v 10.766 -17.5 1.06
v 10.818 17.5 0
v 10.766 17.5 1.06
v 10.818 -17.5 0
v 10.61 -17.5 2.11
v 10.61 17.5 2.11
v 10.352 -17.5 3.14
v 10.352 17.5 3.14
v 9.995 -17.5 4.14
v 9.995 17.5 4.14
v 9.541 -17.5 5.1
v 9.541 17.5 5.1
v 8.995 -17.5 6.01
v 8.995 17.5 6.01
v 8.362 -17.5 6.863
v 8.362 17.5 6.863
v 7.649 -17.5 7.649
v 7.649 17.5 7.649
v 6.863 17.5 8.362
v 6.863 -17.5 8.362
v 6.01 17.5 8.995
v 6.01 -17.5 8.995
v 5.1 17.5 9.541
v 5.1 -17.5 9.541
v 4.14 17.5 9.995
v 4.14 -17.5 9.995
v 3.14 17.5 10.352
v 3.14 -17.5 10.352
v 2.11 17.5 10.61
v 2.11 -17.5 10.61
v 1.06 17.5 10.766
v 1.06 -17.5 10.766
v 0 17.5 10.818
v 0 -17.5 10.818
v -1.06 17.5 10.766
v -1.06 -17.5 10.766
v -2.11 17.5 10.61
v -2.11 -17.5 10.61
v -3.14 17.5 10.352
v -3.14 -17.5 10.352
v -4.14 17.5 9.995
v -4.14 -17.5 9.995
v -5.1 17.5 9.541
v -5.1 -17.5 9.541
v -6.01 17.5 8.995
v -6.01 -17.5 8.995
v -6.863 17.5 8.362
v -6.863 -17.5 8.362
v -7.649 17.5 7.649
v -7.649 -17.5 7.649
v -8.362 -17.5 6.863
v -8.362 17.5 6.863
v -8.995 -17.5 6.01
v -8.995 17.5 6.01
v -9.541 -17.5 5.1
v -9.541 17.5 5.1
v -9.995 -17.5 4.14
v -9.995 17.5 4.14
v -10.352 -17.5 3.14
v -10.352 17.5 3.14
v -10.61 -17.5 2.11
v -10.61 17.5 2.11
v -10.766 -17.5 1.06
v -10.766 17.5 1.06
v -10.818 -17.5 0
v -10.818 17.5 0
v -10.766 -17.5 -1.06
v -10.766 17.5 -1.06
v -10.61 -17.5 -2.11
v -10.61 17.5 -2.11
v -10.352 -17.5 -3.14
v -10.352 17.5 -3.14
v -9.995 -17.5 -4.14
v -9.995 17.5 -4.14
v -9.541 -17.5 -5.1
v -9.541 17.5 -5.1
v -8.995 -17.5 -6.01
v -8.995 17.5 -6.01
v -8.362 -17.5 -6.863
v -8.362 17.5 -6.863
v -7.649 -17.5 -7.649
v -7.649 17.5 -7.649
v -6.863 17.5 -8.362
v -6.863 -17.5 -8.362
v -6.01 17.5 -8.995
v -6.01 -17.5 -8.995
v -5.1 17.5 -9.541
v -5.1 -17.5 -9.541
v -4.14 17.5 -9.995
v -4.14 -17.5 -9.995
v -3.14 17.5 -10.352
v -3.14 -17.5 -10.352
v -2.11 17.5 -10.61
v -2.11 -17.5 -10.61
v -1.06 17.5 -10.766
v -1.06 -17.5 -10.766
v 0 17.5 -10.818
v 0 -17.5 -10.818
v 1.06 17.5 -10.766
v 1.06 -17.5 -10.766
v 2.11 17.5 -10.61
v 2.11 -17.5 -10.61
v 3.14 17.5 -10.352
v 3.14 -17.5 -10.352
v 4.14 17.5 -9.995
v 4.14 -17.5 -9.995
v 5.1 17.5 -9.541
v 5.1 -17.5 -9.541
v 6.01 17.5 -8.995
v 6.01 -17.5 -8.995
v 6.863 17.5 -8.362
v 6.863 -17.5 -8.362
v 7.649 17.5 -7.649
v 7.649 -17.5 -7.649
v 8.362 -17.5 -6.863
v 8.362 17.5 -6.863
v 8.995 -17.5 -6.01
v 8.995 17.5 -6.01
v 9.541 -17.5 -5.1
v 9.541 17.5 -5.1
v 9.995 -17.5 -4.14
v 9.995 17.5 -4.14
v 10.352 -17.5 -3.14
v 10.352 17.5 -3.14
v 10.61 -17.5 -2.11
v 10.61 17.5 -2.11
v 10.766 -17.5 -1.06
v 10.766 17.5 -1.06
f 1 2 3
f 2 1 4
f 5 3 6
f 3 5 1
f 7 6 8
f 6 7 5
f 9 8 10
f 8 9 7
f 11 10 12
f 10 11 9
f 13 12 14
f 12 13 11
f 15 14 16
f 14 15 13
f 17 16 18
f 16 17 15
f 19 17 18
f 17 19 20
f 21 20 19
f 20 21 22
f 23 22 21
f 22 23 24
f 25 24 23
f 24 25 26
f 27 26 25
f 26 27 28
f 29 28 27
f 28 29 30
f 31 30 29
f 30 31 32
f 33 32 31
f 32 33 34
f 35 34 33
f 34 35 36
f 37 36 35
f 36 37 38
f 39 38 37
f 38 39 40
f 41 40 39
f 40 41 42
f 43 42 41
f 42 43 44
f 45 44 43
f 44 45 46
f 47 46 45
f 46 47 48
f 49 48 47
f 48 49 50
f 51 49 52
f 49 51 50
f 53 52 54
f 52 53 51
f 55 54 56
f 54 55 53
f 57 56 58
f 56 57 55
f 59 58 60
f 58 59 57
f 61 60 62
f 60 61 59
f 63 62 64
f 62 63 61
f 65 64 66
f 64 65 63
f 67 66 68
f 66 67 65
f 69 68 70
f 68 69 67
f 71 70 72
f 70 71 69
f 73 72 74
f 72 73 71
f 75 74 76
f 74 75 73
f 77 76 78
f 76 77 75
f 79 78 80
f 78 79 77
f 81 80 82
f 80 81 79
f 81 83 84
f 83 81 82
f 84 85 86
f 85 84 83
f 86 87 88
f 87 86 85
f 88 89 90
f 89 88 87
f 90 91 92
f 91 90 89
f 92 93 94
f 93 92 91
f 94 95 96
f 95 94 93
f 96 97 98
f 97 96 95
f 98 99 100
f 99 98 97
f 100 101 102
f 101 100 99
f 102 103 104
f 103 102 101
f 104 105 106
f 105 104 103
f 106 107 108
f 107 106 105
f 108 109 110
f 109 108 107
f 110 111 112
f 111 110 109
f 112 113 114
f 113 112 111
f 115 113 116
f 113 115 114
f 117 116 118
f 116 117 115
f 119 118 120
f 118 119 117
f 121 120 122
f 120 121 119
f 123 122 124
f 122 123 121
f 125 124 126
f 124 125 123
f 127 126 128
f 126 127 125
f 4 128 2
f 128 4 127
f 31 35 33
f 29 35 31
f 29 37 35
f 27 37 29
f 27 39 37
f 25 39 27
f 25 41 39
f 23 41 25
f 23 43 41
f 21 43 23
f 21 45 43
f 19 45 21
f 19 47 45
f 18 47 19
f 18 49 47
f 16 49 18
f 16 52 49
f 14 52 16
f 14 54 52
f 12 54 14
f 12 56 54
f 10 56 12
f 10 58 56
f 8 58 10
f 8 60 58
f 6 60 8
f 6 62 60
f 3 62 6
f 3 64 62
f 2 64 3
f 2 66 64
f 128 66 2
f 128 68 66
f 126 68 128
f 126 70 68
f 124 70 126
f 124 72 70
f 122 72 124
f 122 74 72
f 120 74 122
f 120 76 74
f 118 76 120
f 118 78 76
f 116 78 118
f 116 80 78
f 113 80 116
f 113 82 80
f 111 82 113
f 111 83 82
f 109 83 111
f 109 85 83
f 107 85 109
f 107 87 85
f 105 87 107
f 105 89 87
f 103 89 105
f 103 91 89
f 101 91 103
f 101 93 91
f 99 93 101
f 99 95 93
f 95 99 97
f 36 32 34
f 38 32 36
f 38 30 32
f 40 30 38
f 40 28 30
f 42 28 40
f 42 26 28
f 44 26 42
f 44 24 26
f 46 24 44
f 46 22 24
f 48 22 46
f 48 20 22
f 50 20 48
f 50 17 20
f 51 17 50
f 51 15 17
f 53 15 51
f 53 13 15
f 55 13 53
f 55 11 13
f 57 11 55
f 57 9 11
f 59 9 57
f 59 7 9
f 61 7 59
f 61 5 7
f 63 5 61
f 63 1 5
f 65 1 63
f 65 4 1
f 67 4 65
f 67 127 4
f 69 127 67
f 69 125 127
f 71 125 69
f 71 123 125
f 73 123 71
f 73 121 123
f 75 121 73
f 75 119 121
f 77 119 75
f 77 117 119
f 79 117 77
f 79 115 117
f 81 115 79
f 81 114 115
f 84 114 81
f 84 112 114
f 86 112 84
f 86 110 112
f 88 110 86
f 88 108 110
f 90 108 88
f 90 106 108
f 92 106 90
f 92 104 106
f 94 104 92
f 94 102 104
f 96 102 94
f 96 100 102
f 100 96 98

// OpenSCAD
// [FL_INDEX: keywords="openscad, 3d_parametric, PVC_Pipe, csg_solid" | COT="Parametric OpenSCAD design from 3DCodeverse"]
// Title: PVC Pipe

// This generates geometry for creating PVC pipe fittings
// Licenced under Creative Commons: Attribution, Share-Alike
//		http://creativecommons.org/licenses/by-sa/3.0/
// For attribution you can direct people to the original file on thingiverse:
// 		http://www.thingiverse.com/thing:222574

// ================ variables

//CUSTOMIZER VARIABLES

/* [Main] */

// Rated strength
schedule=40; // [40:schedule_40,1:schedule_80]

// Nominal size ("inch")
nom_idx=0; // [0:1/2,1:3/4,2:1,3:1 1/4,4:1 1/2,5:2,6:2 1/2,7:3,8:4,9:5,10:6,11:8,12:10,13:12,14:14,15:16]

// Length in mm
length=35;

// What to generate
generate=1; // [0:outside fitting,1:outside fitting - boolean diff,2:inside fitting,3:inside fitting - boolean diff,4:inside outside,5:inside outside - boolean diff]

// Tightness of fit, in mm (0=tight 0.3=snug 0.6=loose)
tightness=0.3; // 0.0,1.0

// In points per cylinder
resolution=64;

//CUSTOMIZER VARIABLES END
/* [Hidden] */

// =============== calculated variables
$fn=resolution;

// =============== program

// ---- Data
nom_data=["1/2","3/4","1","1 1/4","1 1/2","2","2 1/2","3","4","5","6","8","10","12","14","16"];
sch40id_data=[0.622,0.824,1.049,1.38,1.61,2.067,2.469,3.068,4.026,5.047,6.065,7.981,10.02,11.938,13.124,15];
sch40od_data=[0.84,1.05,1.315,1.66,1.9,2.375,2.875,3.5,4.5,5.563,6.625,8.625,10.75,12.75,14,16];
sch40pvcweight_data=[0.16,0.21,0.32,0.43,0.51,0.68,1.07,1.41,2.01,2.73,3.53,5.39,7.55,10.01,11.8,15.43];
sch40cpvcweight_data=[0.17,0.23,0.34,0.46,0.55,0.74,1.18,1.54,2.2,-1,3.86,5.81,8.24,10.89,-1,-1];
sch80id_data=[0.546,0.742,0.957,1.278,1.5,1.939,2.323,2.9,3.826,4.813,5.761,7.625,9.564,11.376,12.5,14.314];
sch80od_data=[0.84,1.05,1.315,1.66,1.9,2.375,2.875,3.5,4.5,5.563,6.625,8.625,10.75,12.75,14,16];
sch80pvcweight_data=[0.2,0.27,0.41,0.52,0.67,0.95,1.45,1.94,2.75,3.87,5.42,8.05,12,16.5,19.3,25.44];
sch80cpvcweight_data=[0.22,0.3,0.44,0.61,0.74,1.02,1.56,2.09,3.05,-1,5.82,8.83,13.09,18,-1,-1];
thou2mm=25.4;

//---- Functions

/////////////////////////////////////////////////////////
// module create_pvc_component()
// This generates geometry for creating PVC pipe fittings.
// In general, you should use create_pvc() instead because it gives more options.
// schedule = Rated strength (40 or 80)
// nom_idx = Nominal size index as described by nom_data[] 
// length - Length in mm
// generate - What to generate:
//		0="outside fitting"
//		1="outside fitting - boolean diff"
//		2="inside fitting"
//		3="inside fitting - boolean diff"
// tightness - Tightness of fit, in mm (0=tight 0.3=snug 0.6=loose)
module create_pvc_component(schedule=40,nom_idx=0,generate=0,tightness=0.02,length=35) {
	dia=
	(thou2mm*(schedule==80 ?
		(generate==0||generate==1?sch80od_data[nom_idx]:sch80id_data[nom_idx])
		:
		(generate==0||generate==1?sch40od_data[nom_idx]:sch40id_data[nom_idx])
	))
	+(generate==2||generate==3?-tightness:tightness);
	echo("========== INFO ==========");
	echo(str("for ",nom_data[nom_idx],"in (nom) pipe"));
	echo(str("created ",dia,"mm dia part"));
	echo(str("including ",(generate==2||generate==3?-tightness:tightness),"mm for fit"));
	echo("==========================");
	// now draw it
	rotate([90,0,0]) if(generate==1||generate==3){
		cylinder(r=dia/2,h=length,center=true);
	}else{
		difference() {
			cube([dia+10,dia+10,length],center=true);
			cylinder(r=dia/2,h=length,center=true);
		}
	}
};

/////////////////////////////////////////////////////////
// module create_pvc()
// This generates geometry for creating PVC pipe fittings.
// Just like create_pvc_component() only adds generate options 4 and 5
// schedule = Rated strength (40 or 80)
// nom_idx = Nominal size index as described by nom_data[] 
// length - Length in mm
// generate - What to generate:
//		0="outside fitting"
//		1="outside fitting - boolean diff"
//		2="inside fitting"
//		3="inside fitting - boolean diff"
//		4="inside outside"
//		5="inside outside - boolean diff"
// tightness - Tightness of fit, in mm (0=tight 0.3=snug 0.6=loose)
module create_pvc(schedule=40,nom_idx=0,generate=0,tightness=0.02,length=35) {
	if(generate<=3){
		create_pvc_component(schedule,nom_idx,generate,tightness,length);
	}
	else if(generate==4){
		difference() {
			create_pvc_component(schedule,nom_idx,1,tightness,length);
			create_pvc_component(schedule,nom_idx,3,tightness,length*2);
		}
	}
	else{
		union() {
			create_pvc_component(schedule,nom_idx,0,tightness,length);
			create_pvc_component(schedule,nom_idx,3,tightness,length);
		}
	}
};

//---- The program
create_pvc(schedule,nom_idx,generate,tightness,length);
